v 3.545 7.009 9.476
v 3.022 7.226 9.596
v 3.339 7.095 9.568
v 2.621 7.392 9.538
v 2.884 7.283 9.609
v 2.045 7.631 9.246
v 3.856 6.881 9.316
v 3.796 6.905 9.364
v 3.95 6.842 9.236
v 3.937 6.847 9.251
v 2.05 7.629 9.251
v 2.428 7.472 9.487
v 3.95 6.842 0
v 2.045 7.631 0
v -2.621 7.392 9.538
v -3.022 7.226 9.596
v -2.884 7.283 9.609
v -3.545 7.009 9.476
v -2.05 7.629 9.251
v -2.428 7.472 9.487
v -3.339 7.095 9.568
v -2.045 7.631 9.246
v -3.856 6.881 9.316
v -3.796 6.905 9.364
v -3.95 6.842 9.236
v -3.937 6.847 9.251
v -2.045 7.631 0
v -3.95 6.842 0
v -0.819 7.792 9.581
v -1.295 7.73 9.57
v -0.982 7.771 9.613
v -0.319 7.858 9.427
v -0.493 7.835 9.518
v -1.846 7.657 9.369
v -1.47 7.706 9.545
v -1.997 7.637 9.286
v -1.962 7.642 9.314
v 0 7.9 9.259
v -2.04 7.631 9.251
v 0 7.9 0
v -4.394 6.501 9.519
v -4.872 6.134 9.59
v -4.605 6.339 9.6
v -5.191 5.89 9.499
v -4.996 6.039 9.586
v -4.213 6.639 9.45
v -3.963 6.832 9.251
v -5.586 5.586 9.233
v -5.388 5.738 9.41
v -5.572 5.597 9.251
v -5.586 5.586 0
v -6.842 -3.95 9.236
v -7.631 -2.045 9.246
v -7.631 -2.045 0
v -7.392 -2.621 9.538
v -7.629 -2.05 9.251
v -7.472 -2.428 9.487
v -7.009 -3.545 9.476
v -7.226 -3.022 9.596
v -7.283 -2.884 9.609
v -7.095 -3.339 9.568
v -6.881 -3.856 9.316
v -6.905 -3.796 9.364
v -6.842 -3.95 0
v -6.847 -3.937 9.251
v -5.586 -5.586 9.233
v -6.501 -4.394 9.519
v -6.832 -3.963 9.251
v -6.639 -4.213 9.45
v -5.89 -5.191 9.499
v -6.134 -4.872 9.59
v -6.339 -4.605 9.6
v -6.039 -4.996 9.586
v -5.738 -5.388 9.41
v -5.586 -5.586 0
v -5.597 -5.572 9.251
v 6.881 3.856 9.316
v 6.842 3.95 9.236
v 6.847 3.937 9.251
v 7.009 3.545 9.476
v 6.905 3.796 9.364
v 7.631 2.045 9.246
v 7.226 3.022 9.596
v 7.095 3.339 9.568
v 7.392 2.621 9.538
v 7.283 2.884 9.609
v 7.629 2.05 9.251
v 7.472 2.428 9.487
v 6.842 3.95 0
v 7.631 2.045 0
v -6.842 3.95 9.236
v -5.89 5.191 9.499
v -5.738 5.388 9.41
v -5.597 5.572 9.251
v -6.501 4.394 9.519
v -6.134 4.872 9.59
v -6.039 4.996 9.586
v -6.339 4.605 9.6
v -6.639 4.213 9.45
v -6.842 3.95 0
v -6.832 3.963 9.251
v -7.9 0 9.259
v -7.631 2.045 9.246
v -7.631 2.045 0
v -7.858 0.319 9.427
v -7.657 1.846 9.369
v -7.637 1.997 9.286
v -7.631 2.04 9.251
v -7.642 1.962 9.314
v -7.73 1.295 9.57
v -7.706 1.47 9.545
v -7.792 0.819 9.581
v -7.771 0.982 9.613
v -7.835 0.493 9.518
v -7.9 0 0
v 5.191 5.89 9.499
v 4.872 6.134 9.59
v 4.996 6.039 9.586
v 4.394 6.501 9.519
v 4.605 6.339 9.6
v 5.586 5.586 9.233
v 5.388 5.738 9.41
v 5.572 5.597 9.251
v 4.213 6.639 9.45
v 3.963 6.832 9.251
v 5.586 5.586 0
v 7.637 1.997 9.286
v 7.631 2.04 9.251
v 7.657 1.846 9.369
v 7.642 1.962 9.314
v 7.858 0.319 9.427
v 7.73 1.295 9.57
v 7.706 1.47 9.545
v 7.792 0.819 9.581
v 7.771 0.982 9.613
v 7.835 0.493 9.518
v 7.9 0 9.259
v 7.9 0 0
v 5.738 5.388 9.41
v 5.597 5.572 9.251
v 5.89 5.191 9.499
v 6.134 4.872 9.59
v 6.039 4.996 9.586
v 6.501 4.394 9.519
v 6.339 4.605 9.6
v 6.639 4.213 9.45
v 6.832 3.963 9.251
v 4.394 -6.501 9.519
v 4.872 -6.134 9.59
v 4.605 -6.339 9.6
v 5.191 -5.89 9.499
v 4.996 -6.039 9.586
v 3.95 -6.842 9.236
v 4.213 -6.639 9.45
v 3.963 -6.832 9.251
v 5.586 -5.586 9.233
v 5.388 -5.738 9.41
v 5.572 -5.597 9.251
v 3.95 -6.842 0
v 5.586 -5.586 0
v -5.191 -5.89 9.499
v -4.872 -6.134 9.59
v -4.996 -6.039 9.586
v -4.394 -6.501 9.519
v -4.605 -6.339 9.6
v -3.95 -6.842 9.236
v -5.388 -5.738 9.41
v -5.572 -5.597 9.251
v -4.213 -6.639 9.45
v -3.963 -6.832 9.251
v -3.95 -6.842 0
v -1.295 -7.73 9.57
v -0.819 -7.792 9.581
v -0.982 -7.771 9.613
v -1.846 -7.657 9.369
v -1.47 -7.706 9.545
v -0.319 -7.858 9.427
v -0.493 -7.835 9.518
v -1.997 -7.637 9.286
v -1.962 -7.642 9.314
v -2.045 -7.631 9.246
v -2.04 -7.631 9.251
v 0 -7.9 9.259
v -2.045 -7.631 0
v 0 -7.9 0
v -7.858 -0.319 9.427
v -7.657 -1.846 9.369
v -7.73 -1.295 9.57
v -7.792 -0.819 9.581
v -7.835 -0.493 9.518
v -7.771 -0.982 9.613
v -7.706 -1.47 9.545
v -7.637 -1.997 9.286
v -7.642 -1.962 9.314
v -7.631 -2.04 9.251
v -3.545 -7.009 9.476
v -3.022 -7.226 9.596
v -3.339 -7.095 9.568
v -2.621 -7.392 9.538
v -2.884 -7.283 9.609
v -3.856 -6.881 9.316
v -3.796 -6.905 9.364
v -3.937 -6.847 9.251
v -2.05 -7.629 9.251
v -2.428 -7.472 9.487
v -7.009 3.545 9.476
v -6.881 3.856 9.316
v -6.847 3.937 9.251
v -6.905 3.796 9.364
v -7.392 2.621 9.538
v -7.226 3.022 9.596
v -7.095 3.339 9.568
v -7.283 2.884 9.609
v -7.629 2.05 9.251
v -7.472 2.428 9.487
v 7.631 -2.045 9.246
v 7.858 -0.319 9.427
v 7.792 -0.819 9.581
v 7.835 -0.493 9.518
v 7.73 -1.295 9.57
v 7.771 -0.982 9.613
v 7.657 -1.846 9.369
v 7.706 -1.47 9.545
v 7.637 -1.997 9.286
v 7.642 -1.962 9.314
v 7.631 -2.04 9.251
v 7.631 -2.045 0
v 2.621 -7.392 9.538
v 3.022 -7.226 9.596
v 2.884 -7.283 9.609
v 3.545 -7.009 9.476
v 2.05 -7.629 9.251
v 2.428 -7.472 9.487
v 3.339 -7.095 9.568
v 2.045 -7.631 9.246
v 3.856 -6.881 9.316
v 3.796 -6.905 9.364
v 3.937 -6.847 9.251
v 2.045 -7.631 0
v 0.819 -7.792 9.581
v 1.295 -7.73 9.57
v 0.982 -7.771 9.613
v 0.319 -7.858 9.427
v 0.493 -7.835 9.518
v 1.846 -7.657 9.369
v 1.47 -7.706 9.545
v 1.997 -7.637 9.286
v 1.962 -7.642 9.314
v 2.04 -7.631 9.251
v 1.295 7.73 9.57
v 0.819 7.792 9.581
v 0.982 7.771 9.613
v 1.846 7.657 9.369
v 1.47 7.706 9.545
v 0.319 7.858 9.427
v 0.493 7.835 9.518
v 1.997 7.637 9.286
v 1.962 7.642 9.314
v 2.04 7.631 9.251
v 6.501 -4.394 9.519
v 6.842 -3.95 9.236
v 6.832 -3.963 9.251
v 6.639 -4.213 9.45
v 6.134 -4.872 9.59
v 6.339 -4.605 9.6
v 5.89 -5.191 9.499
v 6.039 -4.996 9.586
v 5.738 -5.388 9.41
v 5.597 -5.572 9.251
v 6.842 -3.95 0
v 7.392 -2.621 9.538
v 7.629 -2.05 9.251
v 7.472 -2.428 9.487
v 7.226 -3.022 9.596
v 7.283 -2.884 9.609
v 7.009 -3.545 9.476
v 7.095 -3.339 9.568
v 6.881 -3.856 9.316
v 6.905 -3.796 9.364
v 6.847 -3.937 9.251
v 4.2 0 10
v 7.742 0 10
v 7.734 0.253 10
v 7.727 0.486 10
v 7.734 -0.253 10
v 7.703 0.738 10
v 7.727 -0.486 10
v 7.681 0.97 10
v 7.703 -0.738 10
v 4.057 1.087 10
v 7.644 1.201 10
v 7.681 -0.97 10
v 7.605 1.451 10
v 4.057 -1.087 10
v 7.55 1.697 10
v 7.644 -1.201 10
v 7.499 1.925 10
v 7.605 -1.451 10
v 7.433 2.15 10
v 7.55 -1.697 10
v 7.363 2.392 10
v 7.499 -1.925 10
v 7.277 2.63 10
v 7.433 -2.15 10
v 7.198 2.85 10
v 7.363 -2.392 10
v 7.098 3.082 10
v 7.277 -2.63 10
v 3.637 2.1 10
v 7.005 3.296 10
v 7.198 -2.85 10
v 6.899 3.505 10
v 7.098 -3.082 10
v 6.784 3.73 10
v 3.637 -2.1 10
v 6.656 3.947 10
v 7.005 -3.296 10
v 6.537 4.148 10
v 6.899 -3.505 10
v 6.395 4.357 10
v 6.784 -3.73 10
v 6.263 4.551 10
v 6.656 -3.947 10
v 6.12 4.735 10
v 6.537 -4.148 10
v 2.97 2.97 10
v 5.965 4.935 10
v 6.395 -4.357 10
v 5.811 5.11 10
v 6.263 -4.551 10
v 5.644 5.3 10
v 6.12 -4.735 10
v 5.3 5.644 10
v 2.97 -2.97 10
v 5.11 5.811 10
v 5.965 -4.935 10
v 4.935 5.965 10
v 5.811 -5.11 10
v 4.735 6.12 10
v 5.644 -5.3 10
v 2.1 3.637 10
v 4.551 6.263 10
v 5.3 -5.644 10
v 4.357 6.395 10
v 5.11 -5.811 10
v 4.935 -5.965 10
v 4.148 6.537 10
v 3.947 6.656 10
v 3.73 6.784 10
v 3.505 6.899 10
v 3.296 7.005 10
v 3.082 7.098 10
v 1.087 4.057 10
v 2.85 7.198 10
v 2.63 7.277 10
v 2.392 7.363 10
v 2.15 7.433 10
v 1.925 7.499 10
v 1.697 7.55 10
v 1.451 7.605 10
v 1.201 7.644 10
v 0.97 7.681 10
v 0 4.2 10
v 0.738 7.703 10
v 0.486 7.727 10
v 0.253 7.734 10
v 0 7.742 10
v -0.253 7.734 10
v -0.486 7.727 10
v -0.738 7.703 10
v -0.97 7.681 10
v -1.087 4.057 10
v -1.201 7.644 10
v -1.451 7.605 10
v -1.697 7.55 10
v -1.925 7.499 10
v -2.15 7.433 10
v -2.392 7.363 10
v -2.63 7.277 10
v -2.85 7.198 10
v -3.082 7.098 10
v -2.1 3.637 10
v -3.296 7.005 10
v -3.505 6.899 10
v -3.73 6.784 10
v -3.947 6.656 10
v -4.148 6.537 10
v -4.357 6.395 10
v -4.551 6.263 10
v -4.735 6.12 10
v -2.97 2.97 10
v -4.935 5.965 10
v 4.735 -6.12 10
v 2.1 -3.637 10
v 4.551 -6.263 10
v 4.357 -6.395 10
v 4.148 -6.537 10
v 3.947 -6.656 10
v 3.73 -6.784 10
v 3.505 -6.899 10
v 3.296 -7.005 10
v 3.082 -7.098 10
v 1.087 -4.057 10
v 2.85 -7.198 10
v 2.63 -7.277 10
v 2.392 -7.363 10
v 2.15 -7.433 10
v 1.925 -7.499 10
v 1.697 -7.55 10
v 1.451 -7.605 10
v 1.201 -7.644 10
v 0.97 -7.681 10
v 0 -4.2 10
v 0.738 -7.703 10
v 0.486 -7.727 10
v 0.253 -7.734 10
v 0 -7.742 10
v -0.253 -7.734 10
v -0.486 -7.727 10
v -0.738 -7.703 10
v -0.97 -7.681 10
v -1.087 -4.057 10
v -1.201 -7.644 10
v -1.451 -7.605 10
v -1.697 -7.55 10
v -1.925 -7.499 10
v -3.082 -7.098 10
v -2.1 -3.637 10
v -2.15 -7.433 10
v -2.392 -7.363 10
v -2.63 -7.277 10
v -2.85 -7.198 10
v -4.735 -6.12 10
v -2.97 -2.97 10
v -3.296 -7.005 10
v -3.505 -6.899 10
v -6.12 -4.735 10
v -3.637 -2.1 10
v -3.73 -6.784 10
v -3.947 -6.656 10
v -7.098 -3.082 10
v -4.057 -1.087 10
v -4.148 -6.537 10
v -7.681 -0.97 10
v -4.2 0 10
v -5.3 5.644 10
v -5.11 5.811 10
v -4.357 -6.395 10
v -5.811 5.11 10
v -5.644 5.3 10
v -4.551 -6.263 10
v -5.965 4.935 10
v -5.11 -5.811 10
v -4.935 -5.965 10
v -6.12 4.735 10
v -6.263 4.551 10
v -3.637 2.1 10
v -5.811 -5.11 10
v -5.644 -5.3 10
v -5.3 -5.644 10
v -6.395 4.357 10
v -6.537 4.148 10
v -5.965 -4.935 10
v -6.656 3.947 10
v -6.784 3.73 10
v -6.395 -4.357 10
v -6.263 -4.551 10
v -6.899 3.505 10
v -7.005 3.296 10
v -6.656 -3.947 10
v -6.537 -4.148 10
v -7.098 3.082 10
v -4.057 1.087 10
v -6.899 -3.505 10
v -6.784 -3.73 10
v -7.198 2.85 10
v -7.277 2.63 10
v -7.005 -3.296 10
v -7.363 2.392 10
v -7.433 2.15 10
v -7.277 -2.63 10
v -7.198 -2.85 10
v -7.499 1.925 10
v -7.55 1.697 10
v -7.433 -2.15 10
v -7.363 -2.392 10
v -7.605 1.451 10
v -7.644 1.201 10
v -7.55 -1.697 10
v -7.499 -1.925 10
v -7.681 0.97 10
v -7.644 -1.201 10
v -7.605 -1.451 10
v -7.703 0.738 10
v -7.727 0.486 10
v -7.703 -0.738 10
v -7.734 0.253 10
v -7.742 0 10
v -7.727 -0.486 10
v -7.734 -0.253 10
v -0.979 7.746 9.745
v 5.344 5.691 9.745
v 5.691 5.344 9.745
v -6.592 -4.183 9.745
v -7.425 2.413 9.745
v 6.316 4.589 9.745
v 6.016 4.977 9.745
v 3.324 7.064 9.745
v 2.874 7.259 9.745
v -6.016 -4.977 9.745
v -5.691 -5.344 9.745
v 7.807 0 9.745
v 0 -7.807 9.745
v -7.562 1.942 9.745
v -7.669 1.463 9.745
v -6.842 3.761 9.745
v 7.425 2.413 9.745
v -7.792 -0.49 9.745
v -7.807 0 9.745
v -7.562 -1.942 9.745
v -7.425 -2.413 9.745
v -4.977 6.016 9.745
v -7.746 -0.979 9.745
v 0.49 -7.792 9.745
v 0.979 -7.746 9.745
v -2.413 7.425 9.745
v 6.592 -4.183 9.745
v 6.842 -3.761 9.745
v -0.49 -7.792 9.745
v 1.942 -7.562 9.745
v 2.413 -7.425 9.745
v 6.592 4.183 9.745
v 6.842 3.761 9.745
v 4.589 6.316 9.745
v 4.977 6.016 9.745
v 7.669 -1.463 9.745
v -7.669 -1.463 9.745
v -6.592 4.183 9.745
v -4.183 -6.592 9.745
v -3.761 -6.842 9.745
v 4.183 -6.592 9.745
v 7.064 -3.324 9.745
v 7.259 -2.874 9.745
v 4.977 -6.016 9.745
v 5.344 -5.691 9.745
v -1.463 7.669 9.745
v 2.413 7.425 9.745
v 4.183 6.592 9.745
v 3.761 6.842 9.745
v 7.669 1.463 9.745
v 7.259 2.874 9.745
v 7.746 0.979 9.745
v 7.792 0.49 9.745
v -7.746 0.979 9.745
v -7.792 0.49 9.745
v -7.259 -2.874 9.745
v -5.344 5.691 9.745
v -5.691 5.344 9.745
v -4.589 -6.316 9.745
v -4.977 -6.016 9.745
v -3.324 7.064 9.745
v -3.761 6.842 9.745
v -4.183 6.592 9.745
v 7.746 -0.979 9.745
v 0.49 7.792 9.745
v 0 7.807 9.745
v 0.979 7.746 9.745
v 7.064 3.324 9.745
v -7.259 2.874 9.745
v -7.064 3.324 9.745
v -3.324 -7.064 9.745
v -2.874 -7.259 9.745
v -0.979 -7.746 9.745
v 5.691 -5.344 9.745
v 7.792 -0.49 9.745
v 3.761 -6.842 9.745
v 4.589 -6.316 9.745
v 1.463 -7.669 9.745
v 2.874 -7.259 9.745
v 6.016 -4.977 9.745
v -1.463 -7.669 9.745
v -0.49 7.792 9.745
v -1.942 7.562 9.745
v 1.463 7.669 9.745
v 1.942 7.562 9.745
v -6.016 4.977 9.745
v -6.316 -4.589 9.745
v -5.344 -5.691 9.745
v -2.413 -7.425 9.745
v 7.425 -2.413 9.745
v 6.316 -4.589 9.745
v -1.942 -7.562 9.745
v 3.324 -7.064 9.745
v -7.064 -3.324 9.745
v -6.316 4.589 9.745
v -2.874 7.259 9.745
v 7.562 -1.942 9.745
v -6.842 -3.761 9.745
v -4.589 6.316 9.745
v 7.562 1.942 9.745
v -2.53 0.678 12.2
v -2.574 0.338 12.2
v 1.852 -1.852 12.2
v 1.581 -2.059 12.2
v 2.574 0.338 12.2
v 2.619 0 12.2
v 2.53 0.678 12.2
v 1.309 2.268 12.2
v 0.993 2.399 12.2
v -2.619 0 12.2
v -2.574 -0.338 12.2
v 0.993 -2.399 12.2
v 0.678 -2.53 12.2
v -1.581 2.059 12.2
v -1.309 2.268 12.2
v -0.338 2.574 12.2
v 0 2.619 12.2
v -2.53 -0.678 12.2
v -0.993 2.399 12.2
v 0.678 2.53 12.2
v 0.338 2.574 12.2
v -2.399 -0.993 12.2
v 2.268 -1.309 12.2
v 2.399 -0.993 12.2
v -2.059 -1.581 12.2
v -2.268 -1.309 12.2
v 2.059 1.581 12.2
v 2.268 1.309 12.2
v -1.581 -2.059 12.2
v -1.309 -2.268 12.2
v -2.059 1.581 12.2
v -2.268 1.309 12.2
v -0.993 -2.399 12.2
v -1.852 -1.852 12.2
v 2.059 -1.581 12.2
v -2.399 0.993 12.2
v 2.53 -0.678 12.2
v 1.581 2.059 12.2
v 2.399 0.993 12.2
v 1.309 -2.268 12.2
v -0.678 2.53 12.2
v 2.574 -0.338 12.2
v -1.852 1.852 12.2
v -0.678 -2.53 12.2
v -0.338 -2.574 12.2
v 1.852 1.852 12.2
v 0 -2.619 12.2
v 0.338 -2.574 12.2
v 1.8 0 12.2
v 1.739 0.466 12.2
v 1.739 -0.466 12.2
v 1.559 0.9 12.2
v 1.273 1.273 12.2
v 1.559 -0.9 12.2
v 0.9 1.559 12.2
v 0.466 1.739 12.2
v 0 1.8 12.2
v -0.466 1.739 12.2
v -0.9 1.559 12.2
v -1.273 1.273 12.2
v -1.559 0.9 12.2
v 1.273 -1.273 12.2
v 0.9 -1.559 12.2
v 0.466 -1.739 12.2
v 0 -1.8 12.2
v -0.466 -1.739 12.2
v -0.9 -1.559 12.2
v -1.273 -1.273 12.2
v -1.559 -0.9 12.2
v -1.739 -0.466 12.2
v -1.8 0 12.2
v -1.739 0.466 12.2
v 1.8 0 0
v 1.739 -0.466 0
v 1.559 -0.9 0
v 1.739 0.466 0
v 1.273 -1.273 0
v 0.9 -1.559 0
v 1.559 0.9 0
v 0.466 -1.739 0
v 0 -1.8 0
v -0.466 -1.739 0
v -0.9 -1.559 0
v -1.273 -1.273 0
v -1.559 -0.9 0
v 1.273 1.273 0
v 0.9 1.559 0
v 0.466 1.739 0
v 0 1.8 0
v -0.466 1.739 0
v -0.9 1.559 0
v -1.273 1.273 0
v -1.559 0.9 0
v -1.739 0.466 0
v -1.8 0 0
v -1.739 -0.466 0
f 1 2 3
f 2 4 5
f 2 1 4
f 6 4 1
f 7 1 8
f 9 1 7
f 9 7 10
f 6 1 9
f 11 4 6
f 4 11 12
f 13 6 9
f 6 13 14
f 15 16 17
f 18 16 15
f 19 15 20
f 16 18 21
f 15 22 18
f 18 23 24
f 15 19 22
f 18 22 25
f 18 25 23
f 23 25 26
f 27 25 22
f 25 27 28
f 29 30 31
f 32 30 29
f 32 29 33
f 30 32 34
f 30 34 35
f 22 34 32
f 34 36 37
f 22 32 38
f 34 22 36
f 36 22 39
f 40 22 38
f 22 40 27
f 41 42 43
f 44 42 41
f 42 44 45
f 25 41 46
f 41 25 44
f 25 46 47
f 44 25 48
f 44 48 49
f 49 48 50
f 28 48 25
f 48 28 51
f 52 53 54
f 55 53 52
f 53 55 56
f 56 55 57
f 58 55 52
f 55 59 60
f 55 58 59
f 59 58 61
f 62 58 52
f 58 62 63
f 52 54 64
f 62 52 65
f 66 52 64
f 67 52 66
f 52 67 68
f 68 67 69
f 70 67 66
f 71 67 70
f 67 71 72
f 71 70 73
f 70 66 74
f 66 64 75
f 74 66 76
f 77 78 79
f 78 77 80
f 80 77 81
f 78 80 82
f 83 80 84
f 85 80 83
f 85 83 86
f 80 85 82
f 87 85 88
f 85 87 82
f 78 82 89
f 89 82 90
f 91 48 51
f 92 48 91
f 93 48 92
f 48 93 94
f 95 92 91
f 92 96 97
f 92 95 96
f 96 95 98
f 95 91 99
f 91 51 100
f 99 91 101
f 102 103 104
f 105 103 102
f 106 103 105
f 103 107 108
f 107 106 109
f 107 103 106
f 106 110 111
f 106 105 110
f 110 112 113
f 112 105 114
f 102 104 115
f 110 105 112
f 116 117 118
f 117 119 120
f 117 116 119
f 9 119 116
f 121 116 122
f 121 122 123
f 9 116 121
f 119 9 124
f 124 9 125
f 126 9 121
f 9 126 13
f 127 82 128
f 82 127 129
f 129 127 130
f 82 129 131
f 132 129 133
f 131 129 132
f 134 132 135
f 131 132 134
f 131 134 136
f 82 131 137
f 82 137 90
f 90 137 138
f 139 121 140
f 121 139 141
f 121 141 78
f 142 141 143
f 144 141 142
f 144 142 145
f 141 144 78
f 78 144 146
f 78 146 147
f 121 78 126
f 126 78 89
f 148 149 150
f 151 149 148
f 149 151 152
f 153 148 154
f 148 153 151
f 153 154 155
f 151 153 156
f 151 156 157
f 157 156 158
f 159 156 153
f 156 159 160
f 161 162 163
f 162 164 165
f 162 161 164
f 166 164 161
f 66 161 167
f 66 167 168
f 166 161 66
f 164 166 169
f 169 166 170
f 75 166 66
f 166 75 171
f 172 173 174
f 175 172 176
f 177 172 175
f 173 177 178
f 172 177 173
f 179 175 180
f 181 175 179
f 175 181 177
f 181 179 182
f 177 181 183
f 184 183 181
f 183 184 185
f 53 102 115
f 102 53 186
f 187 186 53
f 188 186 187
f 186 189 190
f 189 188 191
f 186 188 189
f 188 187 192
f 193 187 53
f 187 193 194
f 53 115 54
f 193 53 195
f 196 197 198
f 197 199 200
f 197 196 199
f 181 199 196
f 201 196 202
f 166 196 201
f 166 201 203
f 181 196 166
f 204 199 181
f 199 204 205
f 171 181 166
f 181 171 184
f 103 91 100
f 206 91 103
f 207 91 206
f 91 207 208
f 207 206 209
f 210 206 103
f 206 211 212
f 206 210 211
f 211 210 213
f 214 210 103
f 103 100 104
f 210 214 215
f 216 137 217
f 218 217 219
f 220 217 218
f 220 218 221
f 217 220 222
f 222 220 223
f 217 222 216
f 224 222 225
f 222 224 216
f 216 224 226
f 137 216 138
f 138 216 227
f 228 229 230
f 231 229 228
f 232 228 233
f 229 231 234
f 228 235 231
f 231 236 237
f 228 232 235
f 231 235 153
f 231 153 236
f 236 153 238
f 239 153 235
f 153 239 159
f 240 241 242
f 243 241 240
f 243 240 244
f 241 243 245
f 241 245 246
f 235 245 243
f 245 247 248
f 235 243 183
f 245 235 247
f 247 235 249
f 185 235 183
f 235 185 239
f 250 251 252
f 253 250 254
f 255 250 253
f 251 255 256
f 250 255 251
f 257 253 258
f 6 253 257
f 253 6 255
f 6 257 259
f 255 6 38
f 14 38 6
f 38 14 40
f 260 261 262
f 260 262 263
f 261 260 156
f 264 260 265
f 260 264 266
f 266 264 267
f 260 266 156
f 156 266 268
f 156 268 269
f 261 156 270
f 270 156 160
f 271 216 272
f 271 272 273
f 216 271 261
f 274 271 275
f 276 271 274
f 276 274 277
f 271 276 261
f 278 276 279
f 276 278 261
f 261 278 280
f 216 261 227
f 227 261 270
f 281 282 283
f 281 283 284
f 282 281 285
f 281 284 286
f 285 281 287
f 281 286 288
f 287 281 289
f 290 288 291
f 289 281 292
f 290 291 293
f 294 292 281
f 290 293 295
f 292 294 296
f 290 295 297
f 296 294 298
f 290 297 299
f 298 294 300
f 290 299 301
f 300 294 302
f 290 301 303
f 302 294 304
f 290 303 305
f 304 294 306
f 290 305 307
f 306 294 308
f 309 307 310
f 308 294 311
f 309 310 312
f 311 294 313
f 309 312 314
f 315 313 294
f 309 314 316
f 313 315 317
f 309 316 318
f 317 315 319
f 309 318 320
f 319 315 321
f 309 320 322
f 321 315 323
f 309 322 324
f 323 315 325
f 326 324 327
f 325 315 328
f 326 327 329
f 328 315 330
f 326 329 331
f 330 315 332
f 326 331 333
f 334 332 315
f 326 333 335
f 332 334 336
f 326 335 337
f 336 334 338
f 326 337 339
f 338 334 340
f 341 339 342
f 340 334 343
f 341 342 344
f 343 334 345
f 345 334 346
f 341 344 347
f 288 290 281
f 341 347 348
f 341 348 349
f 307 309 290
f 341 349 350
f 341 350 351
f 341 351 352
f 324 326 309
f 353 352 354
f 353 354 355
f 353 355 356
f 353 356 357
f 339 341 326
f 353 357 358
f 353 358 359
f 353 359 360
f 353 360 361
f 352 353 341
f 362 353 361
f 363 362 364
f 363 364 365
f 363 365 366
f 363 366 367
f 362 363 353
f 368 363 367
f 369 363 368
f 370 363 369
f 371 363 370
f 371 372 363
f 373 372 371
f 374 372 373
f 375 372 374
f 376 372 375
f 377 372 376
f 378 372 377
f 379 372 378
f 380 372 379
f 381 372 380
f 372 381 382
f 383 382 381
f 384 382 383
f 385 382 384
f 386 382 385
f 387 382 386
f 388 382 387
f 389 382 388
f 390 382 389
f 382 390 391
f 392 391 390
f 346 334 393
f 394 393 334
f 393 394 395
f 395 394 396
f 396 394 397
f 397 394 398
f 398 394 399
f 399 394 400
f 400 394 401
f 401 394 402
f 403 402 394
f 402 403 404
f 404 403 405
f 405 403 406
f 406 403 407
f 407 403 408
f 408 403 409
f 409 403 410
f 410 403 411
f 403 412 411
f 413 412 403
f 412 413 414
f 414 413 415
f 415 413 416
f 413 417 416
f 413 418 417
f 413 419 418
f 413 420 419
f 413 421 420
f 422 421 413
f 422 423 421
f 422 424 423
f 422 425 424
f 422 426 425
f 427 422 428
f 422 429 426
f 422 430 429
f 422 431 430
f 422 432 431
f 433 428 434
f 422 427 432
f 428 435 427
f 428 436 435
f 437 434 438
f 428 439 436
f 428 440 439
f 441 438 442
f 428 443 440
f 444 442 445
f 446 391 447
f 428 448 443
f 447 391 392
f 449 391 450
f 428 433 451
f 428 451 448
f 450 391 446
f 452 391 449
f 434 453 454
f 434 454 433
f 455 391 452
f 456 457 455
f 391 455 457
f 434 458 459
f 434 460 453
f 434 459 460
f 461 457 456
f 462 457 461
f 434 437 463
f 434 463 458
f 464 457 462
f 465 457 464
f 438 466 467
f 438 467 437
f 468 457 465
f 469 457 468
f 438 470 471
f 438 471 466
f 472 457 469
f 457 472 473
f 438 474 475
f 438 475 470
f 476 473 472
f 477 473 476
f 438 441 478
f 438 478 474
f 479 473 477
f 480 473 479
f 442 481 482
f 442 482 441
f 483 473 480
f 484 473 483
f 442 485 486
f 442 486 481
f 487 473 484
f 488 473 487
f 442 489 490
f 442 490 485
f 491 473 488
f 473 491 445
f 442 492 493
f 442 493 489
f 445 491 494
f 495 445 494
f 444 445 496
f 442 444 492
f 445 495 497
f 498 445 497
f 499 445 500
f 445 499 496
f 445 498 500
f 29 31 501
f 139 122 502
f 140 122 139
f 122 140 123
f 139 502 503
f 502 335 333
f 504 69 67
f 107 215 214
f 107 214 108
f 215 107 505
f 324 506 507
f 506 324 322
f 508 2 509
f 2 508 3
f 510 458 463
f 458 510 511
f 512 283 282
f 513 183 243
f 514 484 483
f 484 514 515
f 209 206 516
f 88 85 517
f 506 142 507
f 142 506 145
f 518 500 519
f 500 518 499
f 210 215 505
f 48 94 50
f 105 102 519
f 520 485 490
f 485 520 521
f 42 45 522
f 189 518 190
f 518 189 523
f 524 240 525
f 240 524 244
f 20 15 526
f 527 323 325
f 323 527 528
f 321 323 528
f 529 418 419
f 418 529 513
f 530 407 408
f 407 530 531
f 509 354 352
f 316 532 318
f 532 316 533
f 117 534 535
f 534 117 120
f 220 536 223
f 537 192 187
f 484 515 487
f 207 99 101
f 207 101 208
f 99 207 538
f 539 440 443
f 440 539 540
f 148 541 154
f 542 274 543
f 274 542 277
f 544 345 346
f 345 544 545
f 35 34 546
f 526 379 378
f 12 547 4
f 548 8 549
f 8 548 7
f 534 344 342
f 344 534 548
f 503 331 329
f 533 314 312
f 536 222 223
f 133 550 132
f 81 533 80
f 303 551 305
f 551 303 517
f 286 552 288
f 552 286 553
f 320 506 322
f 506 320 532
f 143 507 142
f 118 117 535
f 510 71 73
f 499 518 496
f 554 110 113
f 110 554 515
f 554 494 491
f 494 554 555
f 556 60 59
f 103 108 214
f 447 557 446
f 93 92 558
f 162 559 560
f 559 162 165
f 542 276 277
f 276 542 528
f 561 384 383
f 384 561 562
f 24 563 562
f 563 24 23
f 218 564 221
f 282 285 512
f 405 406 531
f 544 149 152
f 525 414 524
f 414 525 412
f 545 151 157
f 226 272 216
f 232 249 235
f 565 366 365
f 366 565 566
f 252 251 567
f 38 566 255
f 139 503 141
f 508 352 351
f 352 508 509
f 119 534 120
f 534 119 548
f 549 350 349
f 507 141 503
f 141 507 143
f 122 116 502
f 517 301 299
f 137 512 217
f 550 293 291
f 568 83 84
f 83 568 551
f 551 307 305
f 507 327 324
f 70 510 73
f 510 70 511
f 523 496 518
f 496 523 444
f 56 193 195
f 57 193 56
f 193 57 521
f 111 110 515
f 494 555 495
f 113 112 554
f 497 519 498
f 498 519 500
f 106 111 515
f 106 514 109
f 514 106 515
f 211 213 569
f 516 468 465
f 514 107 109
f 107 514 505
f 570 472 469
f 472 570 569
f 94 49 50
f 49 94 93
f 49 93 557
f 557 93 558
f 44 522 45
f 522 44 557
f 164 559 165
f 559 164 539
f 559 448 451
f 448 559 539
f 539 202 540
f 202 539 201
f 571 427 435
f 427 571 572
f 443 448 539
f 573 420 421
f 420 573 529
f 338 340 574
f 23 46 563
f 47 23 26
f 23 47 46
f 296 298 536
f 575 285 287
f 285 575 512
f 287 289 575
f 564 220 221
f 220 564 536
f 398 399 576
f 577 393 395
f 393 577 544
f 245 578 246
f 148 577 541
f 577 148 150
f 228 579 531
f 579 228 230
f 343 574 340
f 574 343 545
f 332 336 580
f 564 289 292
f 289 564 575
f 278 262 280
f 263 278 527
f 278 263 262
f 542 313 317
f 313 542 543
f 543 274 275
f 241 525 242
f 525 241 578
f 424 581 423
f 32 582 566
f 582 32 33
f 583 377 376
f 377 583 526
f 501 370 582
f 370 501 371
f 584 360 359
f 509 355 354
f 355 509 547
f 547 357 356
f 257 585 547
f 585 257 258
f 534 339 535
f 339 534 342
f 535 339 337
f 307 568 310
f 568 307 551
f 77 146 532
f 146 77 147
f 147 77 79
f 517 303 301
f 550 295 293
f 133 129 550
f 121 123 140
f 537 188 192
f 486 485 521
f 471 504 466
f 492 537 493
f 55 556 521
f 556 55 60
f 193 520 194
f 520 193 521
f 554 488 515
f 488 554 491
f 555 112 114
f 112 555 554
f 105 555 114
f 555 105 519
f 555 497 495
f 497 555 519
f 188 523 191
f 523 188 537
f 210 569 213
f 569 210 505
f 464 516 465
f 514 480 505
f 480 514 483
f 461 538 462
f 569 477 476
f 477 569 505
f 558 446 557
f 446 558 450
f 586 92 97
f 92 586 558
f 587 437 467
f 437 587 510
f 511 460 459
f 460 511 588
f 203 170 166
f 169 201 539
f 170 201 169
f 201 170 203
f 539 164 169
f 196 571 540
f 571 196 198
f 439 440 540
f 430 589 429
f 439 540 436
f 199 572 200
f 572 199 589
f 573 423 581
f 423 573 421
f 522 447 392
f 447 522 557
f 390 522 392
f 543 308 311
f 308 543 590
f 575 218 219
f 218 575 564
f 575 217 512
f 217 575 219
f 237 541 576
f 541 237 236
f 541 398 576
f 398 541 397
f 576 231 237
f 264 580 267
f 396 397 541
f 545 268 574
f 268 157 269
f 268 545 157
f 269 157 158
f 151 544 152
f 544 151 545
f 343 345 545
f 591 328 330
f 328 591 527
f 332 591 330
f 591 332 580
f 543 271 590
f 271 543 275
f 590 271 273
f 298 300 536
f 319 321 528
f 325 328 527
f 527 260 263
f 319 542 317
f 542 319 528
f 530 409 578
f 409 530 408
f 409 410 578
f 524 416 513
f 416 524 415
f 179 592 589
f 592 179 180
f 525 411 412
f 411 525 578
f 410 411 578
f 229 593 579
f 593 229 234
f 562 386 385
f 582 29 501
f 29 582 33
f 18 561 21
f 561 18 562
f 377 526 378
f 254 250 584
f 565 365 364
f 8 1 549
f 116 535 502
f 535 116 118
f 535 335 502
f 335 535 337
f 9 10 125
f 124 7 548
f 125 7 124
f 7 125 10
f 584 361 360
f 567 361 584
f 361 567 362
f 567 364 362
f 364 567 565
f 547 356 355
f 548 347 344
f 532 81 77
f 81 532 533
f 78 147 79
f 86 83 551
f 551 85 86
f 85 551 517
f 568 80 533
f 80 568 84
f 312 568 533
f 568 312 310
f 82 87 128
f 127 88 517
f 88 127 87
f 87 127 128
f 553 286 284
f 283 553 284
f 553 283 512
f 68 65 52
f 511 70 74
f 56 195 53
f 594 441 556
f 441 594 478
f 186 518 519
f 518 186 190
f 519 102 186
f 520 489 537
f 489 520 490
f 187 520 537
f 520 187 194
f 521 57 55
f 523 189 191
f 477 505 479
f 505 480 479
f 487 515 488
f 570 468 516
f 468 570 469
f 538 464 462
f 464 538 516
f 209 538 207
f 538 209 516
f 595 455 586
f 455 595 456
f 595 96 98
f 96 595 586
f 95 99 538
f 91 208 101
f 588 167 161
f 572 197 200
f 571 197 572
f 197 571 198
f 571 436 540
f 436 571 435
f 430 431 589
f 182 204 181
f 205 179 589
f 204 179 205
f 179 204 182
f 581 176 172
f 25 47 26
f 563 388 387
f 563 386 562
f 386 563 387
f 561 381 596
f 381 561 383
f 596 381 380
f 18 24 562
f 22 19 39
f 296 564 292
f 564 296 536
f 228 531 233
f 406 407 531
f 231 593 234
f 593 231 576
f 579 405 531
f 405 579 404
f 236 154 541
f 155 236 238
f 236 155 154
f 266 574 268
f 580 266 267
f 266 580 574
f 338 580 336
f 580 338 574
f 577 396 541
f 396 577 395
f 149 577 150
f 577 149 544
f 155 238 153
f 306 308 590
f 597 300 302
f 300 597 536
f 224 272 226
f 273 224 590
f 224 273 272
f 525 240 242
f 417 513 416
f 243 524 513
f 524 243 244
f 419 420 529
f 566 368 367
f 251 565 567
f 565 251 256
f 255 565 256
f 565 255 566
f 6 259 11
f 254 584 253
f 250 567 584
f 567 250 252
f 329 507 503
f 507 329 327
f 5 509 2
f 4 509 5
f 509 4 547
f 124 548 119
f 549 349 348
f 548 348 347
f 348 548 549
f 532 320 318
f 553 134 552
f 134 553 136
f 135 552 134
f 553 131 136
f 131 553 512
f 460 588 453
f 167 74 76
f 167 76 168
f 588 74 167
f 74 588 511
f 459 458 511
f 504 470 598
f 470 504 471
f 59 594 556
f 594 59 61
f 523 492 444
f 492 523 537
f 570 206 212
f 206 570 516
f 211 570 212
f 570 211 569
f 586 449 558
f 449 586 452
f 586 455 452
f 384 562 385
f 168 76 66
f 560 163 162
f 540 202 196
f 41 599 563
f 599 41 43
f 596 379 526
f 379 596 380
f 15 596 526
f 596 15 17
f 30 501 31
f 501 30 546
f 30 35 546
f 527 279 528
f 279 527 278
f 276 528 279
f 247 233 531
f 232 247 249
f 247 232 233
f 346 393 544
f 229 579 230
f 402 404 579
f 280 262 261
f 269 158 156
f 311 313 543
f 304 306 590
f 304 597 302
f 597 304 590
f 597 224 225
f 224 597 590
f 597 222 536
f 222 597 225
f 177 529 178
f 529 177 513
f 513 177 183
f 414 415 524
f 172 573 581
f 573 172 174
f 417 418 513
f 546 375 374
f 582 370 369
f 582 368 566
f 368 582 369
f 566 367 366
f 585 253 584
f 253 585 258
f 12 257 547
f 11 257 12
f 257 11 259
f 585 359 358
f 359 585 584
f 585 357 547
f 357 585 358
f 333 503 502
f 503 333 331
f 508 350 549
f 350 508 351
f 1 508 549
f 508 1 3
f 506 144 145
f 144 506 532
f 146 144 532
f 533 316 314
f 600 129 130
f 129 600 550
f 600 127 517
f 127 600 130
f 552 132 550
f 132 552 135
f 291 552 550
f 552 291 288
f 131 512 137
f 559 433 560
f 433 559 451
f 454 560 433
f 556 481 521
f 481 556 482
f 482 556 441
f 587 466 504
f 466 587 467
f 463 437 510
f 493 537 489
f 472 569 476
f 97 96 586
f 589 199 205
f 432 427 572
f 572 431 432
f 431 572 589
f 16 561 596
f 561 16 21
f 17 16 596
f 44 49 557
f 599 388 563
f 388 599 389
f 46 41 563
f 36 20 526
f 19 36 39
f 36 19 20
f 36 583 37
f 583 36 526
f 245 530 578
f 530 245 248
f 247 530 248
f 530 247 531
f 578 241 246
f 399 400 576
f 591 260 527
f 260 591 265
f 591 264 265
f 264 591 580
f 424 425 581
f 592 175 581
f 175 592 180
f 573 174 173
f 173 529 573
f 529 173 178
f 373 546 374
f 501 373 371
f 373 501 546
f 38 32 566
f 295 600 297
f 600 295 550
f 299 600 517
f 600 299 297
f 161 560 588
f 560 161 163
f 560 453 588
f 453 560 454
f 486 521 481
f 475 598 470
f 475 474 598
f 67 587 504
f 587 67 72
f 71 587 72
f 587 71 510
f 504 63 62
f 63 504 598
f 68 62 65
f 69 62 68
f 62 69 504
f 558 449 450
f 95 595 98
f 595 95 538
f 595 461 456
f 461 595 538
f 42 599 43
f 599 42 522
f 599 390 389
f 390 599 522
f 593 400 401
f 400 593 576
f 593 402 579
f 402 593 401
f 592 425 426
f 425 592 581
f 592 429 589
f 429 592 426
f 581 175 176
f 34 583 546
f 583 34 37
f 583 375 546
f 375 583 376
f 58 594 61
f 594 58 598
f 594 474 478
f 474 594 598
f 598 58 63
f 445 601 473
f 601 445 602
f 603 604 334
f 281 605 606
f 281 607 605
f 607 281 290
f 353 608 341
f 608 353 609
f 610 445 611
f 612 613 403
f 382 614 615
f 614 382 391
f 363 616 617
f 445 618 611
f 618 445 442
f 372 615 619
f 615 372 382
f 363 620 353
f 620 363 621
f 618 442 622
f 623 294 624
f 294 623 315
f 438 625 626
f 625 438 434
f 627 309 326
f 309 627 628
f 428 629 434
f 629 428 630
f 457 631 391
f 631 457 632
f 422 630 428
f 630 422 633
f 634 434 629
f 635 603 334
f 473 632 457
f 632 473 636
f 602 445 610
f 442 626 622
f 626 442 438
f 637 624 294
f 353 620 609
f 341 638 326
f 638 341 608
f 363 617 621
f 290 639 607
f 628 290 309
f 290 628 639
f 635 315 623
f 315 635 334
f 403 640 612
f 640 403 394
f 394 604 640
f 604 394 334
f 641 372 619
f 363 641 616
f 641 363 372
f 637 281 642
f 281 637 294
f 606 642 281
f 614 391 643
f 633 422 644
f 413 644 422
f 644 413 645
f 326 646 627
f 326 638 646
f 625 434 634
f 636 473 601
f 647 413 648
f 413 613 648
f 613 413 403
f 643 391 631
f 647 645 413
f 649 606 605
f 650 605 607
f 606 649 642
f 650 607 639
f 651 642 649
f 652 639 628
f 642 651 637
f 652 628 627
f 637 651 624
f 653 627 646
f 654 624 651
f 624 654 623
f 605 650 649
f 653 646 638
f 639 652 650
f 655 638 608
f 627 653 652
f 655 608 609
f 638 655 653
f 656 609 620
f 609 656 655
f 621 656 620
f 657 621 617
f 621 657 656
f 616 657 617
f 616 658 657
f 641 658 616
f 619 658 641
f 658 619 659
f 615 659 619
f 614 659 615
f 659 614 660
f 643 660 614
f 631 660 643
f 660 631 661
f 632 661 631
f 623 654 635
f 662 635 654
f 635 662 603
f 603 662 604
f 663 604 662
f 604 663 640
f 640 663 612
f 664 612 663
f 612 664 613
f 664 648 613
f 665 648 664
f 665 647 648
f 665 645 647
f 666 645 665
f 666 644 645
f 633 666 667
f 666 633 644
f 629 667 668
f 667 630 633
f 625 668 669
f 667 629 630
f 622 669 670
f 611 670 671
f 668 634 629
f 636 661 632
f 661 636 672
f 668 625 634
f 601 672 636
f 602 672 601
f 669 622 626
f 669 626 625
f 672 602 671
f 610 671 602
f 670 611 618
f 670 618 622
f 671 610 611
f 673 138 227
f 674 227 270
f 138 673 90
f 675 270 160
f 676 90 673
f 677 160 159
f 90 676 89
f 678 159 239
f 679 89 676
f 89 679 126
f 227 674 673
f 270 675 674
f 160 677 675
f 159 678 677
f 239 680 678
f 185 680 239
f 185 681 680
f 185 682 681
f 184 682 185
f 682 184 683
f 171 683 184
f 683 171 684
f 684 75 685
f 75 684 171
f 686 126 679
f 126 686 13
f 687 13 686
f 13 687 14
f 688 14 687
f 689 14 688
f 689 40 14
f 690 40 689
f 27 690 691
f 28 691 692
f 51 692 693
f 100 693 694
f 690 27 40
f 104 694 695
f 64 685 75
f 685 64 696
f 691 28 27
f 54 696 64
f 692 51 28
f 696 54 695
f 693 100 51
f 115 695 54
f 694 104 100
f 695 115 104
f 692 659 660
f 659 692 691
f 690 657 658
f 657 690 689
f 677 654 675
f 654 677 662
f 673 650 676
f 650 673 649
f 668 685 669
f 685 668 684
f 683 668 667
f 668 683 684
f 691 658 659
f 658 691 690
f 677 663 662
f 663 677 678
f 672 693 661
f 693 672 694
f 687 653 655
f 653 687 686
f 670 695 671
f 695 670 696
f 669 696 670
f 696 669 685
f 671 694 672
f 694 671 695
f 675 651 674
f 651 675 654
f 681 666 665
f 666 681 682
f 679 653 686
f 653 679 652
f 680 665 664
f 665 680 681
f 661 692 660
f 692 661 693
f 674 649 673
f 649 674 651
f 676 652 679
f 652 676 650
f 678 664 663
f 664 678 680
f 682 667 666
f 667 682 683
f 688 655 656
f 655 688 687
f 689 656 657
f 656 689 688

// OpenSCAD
/*
Budapter SCAD by Free Beachler
inspired by http://www.thingiverse.com/thing:21412

Adapts existing JHead/RepRapFab-compatible extruder, such as Wade's or Greg Frost's extruder designs, to a Budaschnozzle-compatible one.  Helps to reduce filament kinking.

*/

h = 10;
d = 16;
fw = 3.6;
rnd = 2;
nippleheight = 3.2;

module dooschdapter() {
  difference() {
    union() {
      // base
      rotate([0, 0, 90]) cylinder(r = d / 2 - 0.1, h = h - rnd, center=false, $fn=24);
      translate([0, 0, h - rnd])
      intersection() {
          rotate([0, 0, 90]) cylinder(r = d / 2 - 0.1, h = rnd, center=false, $fn=24);
		  translate([0, 0, 0]) sphere(d / 2, $fn=100);
      }
      // nipple
      translate([0, 0, h]) {
        difference() {
          cylinder(r1 = 4.2, r2 = fw / 2 + 0.1, h = nippleheight, center = false, $fn=24);
          translate([-d / 2, -d / 2, nippleheight - 1]) cube([d, d, d]);
        }
      }
    }
  // filament hole
  rotate([0, 0, 90]) cylinder(r = fw / 2, h = h * 4, center=true, $fn=24);
  }
}

translate([0, 0, 0]) dooschdapter();
